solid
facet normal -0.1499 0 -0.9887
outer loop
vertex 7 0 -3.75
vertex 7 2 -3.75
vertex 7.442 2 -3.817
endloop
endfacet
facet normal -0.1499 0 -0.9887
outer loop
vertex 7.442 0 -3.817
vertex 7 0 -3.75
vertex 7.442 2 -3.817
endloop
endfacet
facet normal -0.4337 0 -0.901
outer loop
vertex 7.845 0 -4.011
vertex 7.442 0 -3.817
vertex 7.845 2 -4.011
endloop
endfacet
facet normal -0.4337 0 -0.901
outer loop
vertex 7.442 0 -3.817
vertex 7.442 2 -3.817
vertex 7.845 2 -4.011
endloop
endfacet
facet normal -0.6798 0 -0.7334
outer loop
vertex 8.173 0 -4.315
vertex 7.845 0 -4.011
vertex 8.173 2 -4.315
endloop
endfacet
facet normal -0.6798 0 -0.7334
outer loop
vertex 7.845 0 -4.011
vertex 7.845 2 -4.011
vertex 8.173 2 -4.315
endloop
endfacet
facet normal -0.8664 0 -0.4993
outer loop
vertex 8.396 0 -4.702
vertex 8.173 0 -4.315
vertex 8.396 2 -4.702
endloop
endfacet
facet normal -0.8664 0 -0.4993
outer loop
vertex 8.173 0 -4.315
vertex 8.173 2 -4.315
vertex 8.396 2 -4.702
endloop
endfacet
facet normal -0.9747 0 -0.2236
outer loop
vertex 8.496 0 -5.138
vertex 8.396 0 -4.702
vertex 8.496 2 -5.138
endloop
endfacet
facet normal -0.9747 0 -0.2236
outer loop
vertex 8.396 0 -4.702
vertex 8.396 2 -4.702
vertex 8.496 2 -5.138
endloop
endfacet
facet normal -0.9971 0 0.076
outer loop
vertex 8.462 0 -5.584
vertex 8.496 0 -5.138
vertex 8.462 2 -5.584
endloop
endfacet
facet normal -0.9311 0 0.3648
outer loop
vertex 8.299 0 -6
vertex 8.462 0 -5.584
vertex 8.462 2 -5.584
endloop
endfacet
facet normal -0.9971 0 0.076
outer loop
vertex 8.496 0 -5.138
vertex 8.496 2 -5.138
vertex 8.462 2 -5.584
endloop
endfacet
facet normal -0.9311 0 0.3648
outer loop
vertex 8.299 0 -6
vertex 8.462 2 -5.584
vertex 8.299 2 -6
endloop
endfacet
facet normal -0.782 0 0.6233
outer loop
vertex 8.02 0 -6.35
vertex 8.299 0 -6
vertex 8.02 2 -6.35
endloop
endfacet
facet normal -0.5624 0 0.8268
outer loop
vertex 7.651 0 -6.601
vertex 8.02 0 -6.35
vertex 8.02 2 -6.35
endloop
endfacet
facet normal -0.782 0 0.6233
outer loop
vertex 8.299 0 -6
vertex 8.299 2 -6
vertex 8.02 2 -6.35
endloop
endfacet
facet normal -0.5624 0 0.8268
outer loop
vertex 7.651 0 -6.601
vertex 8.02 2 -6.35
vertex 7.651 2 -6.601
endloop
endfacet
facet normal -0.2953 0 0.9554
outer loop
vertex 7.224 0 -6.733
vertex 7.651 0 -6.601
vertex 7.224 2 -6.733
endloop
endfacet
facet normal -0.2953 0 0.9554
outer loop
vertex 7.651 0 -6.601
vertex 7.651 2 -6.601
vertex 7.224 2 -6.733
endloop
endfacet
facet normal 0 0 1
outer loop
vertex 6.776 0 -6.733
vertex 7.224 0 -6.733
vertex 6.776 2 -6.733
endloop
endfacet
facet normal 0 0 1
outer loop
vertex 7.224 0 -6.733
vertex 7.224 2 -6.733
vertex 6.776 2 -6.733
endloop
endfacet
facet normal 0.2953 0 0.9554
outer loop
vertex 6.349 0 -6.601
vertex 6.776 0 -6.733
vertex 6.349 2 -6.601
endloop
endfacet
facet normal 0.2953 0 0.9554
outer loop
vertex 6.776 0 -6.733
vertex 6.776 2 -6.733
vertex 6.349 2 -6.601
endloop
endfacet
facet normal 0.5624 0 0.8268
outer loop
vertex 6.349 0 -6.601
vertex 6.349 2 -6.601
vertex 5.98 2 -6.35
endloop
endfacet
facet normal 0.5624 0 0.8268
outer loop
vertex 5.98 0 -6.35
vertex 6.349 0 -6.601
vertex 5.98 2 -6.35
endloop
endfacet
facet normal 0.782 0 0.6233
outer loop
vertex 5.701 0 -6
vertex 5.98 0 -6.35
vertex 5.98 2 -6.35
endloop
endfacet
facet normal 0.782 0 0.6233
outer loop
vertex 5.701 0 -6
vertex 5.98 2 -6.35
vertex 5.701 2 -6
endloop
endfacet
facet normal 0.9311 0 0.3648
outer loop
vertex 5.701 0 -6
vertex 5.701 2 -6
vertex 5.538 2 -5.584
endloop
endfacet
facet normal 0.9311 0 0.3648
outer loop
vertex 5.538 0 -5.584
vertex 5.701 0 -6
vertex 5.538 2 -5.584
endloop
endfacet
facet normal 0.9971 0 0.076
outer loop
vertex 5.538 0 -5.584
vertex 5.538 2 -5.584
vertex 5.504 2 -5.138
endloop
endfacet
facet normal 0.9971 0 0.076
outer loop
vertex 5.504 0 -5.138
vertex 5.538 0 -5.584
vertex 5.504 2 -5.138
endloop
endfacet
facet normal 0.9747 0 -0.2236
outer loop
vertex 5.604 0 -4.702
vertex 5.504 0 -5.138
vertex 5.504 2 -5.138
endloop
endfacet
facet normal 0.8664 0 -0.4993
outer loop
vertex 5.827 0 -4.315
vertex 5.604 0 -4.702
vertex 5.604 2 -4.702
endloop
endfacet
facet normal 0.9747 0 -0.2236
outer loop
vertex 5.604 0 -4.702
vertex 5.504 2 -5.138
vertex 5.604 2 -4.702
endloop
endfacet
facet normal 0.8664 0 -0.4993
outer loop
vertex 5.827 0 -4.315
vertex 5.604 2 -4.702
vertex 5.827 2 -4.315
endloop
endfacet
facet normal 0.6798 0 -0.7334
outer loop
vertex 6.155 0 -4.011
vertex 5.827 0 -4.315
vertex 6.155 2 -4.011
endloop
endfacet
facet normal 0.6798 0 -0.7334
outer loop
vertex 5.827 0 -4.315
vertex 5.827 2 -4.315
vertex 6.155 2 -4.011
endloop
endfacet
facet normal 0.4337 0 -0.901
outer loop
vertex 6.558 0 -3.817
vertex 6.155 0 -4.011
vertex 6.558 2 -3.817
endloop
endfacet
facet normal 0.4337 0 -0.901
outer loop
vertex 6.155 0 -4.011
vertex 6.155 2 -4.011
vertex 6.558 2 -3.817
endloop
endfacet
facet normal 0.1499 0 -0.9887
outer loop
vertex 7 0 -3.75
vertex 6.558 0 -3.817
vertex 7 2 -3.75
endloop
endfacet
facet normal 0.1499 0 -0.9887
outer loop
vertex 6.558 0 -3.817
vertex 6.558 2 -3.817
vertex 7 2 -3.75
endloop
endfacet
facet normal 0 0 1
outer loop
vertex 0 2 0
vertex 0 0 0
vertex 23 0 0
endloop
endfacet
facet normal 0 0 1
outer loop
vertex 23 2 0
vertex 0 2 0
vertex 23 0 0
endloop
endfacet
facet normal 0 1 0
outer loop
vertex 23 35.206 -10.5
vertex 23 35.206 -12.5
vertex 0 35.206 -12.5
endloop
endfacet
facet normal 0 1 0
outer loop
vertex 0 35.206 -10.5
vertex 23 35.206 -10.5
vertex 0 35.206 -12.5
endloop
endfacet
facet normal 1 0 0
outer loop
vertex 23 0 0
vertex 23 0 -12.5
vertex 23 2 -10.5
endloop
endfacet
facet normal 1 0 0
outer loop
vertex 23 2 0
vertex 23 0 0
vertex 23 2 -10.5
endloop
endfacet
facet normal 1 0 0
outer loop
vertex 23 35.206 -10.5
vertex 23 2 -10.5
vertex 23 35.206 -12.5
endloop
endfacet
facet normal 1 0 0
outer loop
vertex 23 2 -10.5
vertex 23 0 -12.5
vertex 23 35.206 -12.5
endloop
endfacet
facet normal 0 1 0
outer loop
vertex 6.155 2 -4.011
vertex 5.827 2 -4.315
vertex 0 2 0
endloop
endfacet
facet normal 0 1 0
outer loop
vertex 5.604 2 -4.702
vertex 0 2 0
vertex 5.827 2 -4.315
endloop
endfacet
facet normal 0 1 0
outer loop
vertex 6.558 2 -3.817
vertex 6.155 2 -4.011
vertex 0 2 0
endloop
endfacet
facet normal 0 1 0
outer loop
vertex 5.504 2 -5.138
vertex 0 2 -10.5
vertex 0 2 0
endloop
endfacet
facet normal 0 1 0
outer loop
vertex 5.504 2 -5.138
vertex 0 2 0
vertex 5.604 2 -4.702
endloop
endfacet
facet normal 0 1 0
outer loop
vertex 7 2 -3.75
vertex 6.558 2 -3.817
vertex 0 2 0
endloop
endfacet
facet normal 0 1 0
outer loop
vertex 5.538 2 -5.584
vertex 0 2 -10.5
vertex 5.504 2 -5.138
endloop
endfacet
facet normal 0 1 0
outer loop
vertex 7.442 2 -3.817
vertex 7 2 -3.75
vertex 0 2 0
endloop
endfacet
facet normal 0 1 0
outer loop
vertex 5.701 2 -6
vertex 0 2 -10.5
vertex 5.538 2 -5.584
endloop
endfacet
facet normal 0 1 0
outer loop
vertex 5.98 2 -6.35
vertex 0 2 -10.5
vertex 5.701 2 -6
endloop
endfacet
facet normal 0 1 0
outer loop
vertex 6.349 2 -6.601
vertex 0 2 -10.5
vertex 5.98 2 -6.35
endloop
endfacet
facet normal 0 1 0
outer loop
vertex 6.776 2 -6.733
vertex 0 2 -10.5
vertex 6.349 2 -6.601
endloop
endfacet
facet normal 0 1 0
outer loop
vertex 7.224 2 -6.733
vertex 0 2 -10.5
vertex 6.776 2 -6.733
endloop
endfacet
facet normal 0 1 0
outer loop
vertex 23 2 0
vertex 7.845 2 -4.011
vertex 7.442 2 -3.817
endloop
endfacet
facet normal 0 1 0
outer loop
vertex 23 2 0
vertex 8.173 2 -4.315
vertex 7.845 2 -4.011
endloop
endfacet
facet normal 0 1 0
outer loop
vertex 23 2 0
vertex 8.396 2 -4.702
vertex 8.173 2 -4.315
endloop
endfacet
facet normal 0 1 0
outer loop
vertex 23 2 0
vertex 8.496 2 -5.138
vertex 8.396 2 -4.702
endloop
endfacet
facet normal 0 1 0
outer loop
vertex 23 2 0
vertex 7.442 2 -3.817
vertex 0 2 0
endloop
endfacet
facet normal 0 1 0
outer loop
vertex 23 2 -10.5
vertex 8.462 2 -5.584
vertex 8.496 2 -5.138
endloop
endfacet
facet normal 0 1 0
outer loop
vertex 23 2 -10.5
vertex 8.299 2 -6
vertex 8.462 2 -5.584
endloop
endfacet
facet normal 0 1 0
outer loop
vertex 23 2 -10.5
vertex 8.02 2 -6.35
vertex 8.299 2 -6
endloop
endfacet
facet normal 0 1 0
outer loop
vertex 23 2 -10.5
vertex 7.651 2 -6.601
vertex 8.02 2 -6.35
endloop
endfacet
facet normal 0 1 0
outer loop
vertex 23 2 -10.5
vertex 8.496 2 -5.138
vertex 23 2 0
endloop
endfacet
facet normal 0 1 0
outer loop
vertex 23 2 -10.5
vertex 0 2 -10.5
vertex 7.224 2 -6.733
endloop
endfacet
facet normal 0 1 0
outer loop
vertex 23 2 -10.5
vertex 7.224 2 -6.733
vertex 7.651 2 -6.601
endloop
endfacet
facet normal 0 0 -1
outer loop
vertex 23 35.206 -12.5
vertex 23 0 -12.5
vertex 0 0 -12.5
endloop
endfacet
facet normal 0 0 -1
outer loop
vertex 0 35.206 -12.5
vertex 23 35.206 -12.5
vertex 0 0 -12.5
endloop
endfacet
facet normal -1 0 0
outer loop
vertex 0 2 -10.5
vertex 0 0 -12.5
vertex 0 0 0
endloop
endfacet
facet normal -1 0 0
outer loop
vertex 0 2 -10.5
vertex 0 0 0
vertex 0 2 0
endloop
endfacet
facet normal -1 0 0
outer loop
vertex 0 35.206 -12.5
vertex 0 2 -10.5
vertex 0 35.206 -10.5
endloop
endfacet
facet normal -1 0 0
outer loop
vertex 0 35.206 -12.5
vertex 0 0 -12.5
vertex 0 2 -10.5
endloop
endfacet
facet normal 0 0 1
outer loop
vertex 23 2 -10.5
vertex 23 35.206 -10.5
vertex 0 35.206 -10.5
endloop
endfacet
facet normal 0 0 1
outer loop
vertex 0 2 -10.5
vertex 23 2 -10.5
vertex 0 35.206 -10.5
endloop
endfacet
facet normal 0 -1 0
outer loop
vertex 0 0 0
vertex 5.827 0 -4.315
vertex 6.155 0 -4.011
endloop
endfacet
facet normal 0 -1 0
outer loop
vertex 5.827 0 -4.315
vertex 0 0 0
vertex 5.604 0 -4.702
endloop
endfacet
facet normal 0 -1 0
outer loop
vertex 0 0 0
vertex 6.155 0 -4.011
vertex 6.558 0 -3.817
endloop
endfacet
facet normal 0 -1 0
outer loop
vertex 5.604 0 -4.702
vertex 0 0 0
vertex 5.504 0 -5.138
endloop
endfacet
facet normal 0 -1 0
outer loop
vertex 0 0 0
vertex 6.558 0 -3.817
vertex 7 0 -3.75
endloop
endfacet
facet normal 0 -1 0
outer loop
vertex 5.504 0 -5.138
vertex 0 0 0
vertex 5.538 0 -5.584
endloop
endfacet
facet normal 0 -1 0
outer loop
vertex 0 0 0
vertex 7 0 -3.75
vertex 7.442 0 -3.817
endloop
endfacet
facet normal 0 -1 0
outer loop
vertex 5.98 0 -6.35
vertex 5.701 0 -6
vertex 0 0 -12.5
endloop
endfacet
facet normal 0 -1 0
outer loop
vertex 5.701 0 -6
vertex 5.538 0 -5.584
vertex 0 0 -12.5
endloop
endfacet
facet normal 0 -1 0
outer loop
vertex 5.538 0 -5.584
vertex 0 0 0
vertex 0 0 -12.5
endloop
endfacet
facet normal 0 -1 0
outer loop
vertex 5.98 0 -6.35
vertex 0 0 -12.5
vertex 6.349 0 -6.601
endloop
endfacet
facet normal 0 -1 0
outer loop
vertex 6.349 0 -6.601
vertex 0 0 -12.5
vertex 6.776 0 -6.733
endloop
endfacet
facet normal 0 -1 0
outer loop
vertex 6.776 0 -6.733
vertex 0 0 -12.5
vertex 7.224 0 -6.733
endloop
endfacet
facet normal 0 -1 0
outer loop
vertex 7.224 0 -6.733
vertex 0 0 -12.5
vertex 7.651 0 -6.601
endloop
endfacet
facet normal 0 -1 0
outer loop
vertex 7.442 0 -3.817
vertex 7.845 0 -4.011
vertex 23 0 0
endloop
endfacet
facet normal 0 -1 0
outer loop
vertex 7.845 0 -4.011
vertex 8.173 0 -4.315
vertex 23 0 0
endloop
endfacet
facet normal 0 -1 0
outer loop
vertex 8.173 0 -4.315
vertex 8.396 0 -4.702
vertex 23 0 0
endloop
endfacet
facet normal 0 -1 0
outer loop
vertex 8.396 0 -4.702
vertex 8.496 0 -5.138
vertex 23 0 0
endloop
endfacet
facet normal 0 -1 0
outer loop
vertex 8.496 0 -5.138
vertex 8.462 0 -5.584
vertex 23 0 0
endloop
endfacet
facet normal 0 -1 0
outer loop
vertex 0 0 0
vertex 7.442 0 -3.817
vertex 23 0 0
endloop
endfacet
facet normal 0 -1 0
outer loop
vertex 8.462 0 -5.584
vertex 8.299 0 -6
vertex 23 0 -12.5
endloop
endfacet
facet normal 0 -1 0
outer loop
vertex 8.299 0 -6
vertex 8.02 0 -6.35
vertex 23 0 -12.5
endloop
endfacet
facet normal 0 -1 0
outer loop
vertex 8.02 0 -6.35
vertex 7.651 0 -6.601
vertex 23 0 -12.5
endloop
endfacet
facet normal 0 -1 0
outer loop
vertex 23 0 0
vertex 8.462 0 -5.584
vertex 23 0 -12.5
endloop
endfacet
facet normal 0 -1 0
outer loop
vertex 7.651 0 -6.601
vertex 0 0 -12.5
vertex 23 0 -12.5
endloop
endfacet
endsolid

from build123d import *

# Parameters (mm, degrees)
SKETCH1_W           = 23
SKETCH1_H           = 12.5
BOSS_EXTRUDE1_DEPTH = 2
SKETCH2_W           = 23
SKETCH2_H           = 33.206230298
BOSS_EXTRUDE2_DEPTH = 2
SKETCH3_R           = 1.5
CUT_EXTRUDE1_DEPTH  = 2


with BuildPart() as part:
    # Sketch1 → Boss-Extrude1 (new body)
    with BuildSketch(Plane(origin=(0, 0, 0), x_dir=(1, 0, 0), z_dir=(0, 1, 0))):
        with Locations((11.5, 6.25)):
            Rectangle(SKETCH1_W, SKETCH1_H)
    extrude(amount=BOSS_EXTRUDE1_DEPTH)

    # Sketch2 → Boss-Extrude2 (add)
    with BuildSketch(Plane(origin=(0, 0, -12.5), x_dir=(-1, 0, 0), z_dir=(0, 0, -1))):
        with Locations((-11.5, 18.603115149)):
            Rectangle(SKETCH2_W, SKETCH2_H)
    extrude(amount=-BOSS_EXTRUDE2_DEPTH)

    # Sketch3 → Cut-Extrude1 (cut)
    with BuildSketch(Plane(origin=(0, 2, 0), x_dir=(1, 0, 0), z_dir=(0, 1, 0))):
        with Locations(Location((7, 5.25, 0), (0, 0, 270))):
            Circle(SKETCH3_R)
    extrude(amount=-CUT_EXTRUDE1_DEPTH, mode=Mode.SUBTRACT)


solid = part.part
